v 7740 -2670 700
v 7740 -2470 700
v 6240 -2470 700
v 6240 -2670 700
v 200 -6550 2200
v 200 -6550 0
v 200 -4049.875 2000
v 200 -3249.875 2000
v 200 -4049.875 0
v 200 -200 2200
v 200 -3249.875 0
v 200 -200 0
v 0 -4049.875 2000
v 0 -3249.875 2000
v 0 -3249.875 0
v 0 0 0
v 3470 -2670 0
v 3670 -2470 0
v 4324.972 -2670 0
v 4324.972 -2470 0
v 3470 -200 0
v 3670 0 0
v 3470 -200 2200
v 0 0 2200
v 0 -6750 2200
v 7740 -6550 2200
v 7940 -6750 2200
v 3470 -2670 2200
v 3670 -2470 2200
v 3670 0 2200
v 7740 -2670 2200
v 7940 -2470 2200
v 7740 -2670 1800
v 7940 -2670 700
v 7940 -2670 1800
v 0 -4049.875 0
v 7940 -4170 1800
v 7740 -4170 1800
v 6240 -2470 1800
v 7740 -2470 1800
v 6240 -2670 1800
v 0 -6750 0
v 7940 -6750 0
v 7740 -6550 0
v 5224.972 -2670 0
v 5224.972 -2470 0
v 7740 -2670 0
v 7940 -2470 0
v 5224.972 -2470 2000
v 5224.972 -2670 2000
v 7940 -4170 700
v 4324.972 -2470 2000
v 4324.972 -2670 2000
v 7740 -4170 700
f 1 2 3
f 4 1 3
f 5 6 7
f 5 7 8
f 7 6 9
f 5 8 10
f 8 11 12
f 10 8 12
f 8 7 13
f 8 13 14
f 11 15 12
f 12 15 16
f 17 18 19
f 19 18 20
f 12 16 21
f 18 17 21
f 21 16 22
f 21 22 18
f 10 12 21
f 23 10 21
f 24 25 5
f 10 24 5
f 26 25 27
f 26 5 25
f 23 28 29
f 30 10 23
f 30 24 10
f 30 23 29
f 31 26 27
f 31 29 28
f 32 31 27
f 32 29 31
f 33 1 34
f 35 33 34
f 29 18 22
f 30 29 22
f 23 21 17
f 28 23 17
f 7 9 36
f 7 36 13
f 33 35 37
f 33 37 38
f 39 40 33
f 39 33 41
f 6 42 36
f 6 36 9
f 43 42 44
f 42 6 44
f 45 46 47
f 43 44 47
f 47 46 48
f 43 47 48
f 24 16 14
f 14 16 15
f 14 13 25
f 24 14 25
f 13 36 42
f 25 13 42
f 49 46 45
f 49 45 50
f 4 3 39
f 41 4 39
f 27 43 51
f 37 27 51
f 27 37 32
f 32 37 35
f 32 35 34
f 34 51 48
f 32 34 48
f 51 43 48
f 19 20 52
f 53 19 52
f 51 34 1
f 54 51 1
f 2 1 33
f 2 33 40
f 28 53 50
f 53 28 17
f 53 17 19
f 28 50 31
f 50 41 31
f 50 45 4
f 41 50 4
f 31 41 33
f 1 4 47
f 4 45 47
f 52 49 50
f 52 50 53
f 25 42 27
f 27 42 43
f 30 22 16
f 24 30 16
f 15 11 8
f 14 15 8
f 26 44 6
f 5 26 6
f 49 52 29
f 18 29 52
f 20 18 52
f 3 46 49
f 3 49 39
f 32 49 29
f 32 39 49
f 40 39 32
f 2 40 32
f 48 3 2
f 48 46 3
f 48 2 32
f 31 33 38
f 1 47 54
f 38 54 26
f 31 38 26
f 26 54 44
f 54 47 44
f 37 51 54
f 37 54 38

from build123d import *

# Parameters (mm, degrees)
F1_DEPTH  = 2200
F2_W      = 900
F2_H      = 2000
F3_DEPTH  = 300
F4_W      = 800
F4_H      = 2000
F5_DEPTH  = 300
F2_W_2    = 1700
F2_H_2    = 1100
F6_DEPTH  = 200
F7_W      = 1500
F7_H      = 1100
F8_DEPTH  = 200
F9_W      = 200
F9_H      = 200
F10_DEPTH = 1100


with BuildPart() as f1:
    # F0 (on Top) → F1 (new body)
    with BuildSketch(Plane.XY):
        Polygon((3670, 0), (0, 0), (0, -6750), (7940, -6750), (7940, -4170), (7940, -2470), (6240, -2470), (3670, -2470), align=None)
        Polygon((3470, -2670), (7740, -2670), (7740, -6550), (200, -6550), (200, -200), (3470, -200), align=None, mode=Mode.SUBTRACT)
    extrude(amount=F1_DEPTH)

    # F2 (on face) → F3 (cut)
    with BuildSketch(Plane(origin=(0, -2470, 0), x_dir=(-1, 0, 0), z_dir=(0, 1, 0))):
        with Locations((-4774.972248, 1000)):
            Rectangle(F2_W, F2_H)
    extrude(amount=-F3_DEPTH, mode=Mode.SUBTRACT)

    # F4 (on face) → F5 (cut)
    with BuildSketch(Plane.YZ.offset(200)):
        with Locations((-3649.875259, 1000)):
            Rectangle(F4_W, F4_H)
    extrude(amount=-F5_DEPTH, mode=Mode.SUBTRACT)

    # F2 (on face) → F6 (cut)
    with BuildSketch(Plane(origin=(0, -2470, 0), x_dir=(-1, 0, 0), z_dir=(0, 1, 0))):
        with Locations((-7090, 1250)):
            Rectangle(F2_W_2, F2_H_2)
    extrude(amount=-F6_DEPTH, mode=Mode.SUBTRACT)

    # F7 (on face) → F8 (cut)
    with BuildSketch(Plane.YZ.offset(7940)):
        with Locations((-3420, 1250)):
            Rectangle(F7_W, F7_H)
    extrude(amount=-F8_DEPTH, mode=Mode.SUBTRACT)

    # F9 (on face) → F10 (join)
    with BuildSketch(Plane.XY.offset(700)):
        with Locations((7840, -2570)):
            Rectangle(F9_W, F9_H)
    extrude(amount=F10_DEPTH)


solid = f1.part
